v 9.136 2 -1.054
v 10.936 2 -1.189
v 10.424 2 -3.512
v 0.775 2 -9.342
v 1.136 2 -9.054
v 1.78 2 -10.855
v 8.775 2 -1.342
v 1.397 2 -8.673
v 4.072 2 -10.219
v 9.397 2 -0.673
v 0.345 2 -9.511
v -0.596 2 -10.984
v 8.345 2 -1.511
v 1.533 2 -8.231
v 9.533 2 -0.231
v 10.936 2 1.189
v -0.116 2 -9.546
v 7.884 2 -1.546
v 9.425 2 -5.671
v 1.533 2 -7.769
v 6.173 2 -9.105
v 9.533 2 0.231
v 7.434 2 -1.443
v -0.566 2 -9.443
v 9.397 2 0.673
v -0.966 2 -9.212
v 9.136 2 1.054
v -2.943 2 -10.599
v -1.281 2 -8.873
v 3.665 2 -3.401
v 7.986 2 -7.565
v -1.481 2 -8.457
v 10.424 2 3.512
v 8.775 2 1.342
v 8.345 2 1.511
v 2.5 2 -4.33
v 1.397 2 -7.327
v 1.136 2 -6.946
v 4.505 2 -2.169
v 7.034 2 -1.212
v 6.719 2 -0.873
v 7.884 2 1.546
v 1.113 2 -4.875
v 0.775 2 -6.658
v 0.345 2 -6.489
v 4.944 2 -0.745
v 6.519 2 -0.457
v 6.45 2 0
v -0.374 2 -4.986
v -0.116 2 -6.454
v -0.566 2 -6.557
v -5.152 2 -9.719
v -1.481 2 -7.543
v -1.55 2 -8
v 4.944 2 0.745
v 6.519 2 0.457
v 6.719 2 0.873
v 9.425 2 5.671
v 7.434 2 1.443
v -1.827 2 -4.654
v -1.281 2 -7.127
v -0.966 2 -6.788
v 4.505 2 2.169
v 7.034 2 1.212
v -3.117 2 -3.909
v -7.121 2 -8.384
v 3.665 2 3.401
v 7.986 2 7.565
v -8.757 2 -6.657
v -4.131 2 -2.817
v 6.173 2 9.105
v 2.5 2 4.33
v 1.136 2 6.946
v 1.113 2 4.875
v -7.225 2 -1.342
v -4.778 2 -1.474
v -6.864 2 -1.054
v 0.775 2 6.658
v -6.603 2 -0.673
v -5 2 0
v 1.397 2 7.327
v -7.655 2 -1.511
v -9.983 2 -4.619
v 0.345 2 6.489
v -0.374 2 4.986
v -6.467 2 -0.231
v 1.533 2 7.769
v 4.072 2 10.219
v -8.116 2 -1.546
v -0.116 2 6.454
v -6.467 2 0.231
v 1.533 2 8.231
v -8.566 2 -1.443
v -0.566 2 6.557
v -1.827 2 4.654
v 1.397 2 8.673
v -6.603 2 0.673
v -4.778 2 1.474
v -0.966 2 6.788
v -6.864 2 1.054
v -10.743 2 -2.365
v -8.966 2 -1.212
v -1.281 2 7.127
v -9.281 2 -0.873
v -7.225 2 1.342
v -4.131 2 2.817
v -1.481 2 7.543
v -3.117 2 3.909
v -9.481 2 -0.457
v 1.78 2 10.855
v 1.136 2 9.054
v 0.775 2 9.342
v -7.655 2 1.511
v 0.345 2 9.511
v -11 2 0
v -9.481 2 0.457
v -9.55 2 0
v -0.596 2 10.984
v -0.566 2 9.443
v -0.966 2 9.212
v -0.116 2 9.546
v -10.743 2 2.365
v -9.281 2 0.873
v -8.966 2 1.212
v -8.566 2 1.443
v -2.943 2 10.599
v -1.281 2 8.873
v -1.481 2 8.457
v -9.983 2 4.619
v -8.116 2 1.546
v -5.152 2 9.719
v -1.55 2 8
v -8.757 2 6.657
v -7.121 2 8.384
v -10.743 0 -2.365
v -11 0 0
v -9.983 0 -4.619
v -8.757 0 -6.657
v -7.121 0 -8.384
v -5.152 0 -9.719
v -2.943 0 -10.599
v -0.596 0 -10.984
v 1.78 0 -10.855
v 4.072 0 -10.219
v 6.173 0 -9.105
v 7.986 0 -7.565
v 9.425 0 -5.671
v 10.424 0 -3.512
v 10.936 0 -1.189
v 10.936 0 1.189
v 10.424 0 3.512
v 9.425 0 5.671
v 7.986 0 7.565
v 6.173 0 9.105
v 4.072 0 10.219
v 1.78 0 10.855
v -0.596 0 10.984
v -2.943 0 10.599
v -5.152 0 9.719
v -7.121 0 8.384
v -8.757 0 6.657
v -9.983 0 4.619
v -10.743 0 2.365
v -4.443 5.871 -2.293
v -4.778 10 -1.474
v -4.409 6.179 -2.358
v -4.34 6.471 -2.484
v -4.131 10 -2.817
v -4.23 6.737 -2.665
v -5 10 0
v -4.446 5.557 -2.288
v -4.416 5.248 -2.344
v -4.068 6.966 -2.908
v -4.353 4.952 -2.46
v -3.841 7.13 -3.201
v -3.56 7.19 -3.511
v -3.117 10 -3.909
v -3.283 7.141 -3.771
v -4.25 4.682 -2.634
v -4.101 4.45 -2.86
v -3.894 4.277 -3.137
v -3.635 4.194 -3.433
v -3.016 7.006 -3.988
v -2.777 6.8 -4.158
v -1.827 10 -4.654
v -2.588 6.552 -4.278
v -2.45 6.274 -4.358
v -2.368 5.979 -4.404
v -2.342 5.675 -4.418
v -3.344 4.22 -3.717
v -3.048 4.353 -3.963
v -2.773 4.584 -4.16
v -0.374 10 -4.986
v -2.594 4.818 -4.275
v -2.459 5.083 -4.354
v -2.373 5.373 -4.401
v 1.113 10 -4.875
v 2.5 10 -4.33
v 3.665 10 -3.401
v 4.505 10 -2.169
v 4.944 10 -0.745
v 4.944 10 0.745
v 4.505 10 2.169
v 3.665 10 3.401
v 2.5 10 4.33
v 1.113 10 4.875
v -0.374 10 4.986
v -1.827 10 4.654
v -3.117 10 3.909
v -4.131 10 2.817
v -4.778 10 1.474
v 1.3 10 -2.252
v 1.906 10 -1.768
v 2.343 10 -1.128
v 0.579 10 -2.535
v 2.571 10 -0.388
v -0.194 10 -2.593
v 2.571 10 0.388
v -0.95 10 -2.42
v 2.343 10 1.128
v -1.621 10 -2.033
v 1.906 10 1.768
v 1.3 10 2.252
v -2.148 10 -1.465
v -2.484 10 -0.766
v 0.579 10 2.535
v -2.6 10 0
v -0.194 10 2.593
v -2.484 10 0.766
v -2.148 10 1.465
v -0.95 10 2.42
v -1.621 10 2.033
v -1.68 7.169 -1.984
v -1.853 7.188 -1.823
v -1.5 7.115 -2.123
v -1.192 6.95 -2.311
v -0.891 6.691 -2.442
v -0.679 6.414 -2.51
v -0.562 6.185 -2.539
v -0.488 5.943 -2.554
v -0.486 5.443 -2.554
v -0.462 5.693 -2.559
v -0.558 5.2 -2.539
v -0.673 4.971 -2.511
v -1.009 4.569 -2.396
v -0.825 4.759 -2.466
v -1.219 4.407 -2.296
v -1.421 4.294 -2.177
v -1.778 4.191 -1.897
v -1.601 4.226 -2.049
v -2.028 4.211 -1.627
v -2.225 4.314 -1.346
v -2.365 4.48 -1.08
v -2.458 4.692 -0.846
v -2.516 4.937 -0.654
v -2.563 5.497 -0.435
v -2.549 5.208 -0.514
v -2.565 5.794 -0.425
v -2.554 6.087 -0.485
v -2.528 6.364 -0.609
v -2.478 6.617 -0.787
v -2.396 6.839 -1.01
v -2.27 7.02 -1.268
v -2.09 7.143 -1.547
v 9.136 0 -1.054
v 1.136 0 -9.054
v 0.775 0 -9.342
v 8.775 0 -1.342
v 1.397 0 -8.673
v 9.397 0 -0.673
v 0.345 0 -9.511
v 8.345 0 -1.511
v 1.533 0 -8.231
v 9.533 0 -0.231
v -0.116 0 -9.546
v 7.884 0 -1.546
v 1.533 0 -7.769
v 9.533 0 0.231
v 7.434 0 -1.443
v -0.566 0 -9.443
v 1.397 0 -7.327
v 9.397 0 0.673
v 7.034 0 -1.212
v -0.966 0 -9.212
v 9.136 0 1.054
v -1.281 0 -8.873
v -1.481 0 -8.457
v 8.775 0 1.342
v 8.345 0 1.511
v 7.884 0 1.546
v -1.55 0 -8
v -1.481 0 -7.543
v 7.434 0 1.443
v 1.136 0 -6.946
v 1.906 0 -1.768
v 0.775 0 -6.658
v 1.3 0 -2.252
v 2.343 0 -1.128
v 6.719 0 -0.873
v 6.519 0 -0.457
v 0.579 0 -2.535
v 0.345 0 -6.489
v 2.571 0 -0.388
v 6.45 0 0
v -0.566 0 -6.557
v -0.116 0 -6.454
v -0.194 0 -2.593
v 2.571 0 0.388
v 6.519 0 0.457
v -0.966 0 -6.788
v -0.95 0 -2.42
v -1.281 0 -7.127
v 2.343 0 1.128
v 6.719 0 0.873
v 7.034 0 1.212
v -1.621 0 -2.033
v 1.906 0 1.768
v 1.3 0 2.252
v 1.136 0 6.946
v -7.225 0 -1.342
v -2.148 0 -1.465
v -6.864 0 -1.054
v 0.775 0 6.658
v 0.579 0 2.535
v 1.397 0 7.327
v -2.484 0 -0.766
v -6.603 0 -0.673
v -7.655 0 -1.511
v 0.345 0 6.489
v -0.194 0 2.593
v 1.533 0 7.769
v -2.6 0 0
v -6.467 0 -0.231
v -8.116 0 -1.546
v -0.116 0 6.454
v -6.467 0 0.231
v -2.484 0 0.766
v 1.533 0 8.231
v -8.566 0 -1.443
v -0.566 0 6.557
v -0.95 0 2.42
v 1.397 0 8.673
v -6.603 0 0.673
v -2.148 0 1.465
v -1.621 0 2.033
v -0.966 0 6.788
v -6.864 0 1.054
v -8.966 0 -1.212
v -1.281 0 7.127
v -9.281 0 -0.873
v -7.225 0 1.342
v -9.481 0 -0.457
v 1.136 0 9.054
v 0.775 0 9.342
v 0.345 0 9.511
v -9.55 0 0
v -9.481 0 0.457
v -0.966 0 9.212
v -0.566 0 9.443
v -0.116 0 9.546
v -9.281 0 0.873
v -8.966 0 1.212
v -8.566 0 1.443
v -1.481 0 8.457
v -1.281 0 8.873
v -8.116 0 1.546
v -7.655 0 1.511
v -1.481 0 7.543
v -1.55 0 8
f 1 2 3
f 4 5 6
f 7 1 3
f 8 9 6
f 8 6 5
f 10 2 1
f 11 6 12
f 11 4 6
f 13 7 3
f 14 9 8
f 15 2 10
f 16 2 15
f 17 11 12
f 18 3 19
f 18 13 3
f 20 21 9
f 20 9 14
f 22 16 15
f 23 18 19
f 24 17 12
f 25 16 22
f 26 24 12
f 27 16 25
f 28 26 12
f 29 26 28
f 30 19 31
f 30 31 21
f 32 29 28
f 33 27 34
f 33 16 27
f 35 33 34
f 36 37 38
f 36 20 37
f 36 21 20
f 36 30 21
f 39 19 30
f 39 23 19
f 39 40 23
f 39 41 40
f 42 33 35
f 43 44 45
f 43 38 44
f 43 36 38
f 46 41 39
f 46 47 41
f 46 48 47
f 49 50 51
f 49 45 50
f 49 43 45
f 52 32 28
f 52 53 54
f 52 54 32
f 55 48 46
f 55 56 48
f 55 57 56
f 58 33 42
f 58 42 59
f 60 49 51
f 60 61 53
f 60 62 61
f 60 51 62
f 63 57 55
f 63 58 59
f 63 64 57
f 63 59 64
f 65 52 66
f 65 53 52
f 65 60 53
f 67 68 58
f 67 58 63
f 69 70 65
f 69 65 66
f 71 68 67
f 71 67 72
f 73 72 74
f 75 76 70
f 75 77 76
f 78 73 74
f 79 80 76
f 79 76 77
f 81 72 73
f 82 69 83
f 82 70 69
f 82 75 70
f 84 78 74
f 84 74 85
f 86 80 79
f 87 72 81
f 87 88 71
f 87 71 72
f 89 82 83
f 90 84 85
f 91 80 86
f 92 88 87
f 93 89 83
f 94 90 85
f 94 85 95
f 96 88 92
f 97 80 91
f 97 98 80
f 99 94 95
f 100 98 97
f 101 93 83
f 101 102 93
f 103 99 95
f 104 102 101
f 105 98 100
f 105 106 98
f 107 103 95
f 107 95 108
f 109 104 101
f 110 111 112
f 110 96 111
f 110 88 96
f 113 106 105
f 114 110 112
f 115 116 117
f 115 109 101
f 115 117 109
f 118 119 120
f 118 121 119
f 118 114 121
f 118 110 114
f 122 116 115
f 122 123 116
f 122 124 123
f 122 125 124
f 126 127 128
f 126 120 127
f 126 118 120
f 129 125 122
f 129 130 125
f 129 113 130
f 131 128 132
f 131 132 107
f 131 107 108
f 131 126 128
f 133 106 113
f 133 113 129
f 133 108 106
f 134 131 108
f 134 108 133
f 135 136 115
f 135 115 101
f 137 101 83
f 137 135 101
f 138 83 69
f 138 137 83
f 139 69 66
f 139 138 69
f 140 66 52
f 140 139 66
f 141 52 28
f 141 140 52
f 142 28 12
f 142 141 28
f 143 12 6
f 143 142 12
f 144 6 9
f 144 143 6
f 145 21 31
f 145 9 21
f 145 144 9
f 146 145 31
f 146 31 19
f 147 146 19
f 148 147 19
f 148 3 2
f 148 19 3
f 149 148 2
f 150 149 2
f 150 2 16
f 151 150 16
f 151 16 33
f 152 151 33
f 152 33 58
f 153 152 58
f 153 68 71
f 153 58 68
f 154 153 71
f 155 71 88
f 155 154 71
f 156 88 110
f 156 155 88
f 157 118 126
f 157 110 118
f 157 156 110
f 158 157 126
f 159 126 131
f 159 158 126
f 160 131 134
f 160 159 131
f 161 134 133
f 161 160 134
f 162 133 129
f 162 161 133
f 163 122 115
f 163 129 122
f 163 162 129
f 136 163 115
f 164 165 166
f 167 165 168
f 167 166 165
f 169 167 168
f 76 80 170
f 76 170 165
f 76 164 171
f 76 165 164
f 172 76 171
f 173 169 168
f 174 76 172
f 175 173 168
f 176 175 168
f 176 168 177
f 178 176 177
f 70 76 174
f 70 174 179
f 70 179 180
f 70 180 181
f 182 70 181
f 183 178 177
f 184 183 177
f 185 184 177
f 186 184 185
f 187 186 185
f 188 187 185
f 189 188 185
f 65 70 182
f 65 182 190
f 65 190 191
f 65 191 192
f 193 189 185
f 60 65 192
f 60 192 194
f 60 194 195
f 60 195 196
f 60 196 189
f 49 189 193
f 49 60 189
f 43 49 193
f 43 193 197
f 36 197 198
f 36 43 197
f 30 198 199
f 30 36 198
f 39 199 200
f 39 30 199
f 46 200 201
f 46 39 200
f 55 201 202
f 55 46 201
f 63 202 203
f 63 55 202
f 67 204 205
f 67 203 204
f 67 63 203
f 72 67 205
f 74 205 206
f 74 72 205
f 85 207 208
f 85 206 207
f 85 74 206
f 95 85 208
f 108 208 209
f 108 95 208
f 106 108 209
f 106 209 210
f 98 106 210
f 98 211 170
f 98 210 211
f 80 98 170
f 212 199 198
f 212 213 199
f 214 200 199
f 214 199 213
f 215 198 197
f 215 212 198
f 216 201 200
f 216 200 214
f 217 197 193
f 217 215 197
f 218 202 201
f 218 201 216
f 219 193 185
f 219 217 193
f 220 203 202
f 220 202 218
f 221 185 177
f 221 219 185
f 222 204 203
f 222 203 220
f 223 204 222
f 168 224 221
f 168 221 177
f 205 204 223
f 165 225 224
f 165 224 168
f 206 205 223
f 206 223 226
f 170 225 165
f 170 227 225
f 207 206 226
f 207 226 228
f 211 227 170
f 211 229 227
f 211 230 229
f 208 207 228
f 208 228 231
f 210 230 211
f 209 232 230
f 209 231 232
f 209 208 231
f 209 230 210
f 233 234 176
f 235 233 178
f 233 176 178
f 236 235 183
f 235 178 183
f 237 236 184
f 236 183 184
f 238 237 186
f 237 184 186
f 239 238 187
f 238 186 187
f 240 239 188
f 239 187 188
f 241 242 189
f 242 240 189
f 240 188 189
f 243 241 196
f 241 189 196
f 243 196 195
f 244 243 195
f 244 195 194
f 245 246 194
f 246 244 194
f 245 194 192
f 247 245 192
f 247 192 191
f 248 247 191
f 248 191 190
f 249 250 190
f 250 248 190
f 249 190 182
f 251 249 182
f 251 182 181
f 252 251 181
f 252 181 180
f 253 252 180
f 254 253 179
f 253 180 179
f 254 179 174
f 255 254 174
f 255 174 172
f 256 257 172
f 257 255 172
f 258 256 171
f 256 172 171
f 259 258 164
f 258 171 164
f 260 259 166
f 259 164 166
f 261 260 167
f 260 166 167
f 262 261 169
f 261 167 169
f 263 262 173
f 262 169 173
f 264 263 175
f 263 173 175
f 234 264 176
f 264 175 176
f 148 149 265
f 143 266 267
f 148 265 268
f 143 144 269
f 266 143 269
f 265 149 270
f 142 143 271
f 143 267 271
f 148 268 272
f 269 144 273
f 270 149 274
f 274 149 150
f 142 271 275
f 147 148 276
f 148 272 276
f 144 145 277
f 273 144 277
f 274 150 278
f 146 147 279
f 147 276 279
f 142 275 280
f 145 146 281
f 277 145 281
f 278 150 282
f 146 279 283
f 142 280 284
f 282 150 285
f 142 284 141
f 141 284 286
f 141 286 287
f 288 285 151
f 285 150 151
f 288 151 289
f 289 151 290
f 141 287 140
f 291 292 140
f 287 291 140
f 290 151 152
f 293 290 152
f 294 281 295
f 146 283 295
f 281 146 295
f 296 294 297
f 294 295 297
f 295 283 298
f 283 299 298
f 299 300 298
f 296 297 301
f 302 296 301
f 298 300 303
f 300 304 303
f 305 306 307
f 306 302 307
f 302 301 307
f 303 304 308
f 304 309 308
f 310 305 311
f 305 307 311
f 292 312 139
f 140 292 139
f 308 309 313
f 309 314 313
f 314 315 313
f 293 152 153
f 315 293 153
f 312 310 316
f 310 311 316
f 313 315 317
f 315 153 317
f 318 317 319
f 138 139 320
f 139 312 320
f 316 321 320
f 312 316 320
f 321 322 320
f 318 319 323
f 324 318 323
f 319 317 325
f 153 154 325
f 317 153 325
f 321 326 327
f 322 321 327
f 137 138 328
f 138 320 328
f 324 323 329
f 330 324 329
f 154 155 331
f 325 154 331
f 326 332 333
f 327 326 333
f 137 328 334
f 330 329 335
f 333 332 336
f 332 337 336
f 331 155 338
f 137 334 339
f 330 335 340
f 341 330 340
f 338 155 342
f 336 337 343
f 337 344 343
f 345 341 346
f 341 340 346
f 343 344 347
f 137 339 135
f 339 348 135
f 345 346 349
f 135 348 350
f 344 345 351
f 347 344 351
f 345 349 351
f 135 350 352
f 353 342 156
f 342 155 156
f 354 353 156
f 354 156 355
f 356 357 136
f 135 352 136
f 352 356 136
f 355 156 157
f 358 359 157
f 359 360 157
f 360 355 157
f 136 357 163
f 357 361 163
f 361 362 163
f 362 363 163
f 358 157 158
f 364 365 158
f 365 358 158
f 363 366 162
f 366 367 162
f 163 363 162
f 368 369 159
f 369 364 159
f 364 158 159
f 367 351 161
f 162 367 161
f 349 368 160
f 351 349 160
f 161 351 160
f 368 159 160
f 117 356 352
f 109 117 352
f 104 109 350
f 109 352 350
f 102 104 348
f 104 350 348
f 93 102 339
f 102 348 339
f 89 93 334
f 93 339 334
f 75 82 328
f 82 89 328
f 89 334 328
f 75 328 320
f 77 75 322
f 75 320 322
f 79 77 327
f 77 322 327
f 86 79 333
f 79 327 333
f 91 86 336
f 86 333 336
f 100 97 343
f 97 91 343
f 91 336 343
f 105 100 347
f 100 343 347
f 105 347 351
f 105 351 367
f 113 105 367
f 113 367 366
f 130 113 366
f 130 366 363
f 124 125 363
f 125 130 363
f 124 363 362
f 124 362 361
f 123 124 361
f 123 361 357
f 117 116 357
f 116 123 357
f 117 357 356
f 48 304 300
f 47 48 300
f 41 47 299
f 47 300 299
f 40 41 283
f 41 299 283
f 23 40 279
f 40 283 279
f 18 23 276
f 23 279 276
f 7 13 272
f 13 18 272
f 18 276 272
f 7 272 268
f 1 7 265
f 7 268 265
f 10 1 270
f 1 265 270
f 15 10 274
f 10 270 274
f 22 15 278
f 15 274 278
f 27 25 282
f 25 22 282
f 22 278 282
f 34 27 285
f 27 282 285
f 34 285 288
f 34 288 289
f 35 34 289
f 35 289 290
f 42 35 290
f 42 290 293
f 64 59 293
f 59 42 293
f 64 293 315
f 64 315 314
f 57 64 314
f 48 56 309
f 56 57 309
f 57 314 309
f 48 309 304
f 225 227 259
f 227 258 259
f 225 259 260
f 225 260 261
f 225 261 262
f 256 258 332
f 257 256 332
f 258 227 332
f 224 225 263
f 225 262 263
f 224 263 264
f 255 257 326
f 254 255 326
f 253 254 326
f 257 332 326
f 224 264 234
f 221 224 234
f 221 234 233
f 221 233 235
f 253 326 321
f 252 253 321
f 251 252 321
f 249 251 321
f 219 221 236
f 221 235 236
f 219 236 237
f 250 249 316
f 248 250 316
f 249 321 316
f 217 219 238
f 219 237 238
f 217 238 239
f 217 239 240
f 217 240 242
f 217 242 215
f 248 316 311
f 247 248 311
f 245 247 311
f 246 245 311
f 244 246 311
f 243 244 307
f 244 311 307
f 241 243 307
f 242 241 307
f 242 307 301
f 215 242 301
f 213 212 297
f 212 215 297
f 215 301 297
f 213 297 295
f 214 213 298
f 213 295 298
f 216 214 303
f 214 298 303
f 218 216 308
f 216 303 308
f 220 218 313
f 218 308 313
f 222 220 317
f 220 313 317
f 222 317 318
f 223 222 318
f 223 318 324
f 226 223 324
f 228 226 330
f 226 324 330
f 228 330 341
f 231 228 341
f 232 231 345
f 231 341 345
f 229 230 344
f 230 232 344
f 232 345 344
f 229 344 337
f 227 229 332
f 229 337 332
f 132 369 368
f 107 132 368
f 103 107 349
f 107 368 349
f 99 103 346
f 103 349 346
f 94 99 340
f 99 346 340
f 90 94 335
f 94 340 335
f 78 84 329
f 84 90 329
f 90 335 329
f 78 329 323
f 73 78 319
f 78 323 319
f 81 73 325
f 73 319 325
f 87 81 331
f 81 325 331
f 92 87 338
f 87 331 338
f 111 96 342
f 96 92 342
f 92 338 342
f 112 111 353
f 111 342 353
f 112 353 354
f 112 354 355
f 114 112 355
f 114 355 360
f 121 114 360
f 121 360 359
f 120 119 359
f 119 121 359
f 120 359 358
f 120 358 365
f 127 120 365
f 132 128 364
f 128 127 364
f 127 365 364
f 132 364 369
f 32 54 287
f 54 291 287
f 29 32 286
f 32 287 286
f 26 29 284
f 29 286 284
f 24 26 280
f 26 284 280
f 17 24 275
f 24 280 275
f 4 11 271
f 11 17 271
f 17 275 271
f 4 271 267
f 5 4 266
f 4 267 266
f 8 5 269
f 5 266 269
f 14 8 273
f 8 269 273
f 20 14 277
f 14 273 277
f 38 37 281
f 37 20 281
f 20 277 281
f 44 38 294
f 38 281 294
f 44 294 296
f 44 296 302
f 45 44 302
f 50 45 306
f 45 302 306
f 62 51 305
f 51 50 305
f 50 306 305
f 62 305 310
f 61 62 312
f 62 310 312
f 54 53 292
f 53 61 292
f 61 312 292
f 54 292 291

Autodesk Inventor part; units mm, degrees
ref_plane "YZ Plane" through (0, 0, 0) normal (1, 0, 0) x (0, 1, 0)
ref_plane "XZ Plane" through (0, 0, 0) normal (0, 1, 0) x (-1, 0, 0)
sketch "Эскиз1" plane through (0, 0, 0) normal (0, 1, 0) x (-1, 0, 0)
  circle A0 centre (0, 0) radius 5
  circle A1 centre (0, 0) radius 2.6
  circle A2 centre (0, 0) radius 11
  circle A3 centre (8, 0) radius 1.55
  circle A4 centre (-8, 0) radius 1.55
  circle A5 centre (0, 8) radius 1.55
  circle A6 centre (0, -8) radius 1.55
  dimension "d0" = 5.2
  dimension "d1" = 10
  dimension "d2" = 22
  dimension "d3" = 3.1
  dimension "d4" = 3.1
  dimension "d5" = 16
  dimension "d6" = 8
  dimension "d7" = 3.1
  dimension "d8" = 3.1
  dimension "d9" = 8
  dimension "d10" = 8
  dimension "d11" = 16
extrude "Выдавливание1" add sketch "Эскиз1" along normal blind 2 contours A2
extrude "Выдавливание2" add sketch "Эскиз1" along normal blind 10 contours A0
sketch "Эскиз2" plane through (0, 0, 0) normal (1, 0, 0) x (0, 1, 0)
  point P0 (0, 0)
  point P1 (-0.4556, -12.0524)
  point P2 (8.9773, -12.0404)
sketch "Эскиз3" plane through (0, 0, 0) normal (0, 0, 1) x (1, 0, 0)
  point P0 (0, 0)
  point P1 (-11.9191, -0.1213)
  point P2 (-11.9191, 9.5232)
ref_plane "РабПлоскость1" through (0, -0.4556, -12.0524) normal (0.711, -0.0009, 0.7032) x (0, 1, 0.0013)
sketch "Эскиз4" plane through (0, -0.4556, -12.0524) normal (0.711, -0.0009, 0.7032) x (0, 1, 0.0013)
  circle A0 centre (6.1565, 8.569) radius 1.5
  point P0 (0.4709, 8.569)
  dimension "d16" = 3
extrude "Выдавливание3" cut sketch "Эскиз4" along normal up to surface
properties part number "Муфта"
